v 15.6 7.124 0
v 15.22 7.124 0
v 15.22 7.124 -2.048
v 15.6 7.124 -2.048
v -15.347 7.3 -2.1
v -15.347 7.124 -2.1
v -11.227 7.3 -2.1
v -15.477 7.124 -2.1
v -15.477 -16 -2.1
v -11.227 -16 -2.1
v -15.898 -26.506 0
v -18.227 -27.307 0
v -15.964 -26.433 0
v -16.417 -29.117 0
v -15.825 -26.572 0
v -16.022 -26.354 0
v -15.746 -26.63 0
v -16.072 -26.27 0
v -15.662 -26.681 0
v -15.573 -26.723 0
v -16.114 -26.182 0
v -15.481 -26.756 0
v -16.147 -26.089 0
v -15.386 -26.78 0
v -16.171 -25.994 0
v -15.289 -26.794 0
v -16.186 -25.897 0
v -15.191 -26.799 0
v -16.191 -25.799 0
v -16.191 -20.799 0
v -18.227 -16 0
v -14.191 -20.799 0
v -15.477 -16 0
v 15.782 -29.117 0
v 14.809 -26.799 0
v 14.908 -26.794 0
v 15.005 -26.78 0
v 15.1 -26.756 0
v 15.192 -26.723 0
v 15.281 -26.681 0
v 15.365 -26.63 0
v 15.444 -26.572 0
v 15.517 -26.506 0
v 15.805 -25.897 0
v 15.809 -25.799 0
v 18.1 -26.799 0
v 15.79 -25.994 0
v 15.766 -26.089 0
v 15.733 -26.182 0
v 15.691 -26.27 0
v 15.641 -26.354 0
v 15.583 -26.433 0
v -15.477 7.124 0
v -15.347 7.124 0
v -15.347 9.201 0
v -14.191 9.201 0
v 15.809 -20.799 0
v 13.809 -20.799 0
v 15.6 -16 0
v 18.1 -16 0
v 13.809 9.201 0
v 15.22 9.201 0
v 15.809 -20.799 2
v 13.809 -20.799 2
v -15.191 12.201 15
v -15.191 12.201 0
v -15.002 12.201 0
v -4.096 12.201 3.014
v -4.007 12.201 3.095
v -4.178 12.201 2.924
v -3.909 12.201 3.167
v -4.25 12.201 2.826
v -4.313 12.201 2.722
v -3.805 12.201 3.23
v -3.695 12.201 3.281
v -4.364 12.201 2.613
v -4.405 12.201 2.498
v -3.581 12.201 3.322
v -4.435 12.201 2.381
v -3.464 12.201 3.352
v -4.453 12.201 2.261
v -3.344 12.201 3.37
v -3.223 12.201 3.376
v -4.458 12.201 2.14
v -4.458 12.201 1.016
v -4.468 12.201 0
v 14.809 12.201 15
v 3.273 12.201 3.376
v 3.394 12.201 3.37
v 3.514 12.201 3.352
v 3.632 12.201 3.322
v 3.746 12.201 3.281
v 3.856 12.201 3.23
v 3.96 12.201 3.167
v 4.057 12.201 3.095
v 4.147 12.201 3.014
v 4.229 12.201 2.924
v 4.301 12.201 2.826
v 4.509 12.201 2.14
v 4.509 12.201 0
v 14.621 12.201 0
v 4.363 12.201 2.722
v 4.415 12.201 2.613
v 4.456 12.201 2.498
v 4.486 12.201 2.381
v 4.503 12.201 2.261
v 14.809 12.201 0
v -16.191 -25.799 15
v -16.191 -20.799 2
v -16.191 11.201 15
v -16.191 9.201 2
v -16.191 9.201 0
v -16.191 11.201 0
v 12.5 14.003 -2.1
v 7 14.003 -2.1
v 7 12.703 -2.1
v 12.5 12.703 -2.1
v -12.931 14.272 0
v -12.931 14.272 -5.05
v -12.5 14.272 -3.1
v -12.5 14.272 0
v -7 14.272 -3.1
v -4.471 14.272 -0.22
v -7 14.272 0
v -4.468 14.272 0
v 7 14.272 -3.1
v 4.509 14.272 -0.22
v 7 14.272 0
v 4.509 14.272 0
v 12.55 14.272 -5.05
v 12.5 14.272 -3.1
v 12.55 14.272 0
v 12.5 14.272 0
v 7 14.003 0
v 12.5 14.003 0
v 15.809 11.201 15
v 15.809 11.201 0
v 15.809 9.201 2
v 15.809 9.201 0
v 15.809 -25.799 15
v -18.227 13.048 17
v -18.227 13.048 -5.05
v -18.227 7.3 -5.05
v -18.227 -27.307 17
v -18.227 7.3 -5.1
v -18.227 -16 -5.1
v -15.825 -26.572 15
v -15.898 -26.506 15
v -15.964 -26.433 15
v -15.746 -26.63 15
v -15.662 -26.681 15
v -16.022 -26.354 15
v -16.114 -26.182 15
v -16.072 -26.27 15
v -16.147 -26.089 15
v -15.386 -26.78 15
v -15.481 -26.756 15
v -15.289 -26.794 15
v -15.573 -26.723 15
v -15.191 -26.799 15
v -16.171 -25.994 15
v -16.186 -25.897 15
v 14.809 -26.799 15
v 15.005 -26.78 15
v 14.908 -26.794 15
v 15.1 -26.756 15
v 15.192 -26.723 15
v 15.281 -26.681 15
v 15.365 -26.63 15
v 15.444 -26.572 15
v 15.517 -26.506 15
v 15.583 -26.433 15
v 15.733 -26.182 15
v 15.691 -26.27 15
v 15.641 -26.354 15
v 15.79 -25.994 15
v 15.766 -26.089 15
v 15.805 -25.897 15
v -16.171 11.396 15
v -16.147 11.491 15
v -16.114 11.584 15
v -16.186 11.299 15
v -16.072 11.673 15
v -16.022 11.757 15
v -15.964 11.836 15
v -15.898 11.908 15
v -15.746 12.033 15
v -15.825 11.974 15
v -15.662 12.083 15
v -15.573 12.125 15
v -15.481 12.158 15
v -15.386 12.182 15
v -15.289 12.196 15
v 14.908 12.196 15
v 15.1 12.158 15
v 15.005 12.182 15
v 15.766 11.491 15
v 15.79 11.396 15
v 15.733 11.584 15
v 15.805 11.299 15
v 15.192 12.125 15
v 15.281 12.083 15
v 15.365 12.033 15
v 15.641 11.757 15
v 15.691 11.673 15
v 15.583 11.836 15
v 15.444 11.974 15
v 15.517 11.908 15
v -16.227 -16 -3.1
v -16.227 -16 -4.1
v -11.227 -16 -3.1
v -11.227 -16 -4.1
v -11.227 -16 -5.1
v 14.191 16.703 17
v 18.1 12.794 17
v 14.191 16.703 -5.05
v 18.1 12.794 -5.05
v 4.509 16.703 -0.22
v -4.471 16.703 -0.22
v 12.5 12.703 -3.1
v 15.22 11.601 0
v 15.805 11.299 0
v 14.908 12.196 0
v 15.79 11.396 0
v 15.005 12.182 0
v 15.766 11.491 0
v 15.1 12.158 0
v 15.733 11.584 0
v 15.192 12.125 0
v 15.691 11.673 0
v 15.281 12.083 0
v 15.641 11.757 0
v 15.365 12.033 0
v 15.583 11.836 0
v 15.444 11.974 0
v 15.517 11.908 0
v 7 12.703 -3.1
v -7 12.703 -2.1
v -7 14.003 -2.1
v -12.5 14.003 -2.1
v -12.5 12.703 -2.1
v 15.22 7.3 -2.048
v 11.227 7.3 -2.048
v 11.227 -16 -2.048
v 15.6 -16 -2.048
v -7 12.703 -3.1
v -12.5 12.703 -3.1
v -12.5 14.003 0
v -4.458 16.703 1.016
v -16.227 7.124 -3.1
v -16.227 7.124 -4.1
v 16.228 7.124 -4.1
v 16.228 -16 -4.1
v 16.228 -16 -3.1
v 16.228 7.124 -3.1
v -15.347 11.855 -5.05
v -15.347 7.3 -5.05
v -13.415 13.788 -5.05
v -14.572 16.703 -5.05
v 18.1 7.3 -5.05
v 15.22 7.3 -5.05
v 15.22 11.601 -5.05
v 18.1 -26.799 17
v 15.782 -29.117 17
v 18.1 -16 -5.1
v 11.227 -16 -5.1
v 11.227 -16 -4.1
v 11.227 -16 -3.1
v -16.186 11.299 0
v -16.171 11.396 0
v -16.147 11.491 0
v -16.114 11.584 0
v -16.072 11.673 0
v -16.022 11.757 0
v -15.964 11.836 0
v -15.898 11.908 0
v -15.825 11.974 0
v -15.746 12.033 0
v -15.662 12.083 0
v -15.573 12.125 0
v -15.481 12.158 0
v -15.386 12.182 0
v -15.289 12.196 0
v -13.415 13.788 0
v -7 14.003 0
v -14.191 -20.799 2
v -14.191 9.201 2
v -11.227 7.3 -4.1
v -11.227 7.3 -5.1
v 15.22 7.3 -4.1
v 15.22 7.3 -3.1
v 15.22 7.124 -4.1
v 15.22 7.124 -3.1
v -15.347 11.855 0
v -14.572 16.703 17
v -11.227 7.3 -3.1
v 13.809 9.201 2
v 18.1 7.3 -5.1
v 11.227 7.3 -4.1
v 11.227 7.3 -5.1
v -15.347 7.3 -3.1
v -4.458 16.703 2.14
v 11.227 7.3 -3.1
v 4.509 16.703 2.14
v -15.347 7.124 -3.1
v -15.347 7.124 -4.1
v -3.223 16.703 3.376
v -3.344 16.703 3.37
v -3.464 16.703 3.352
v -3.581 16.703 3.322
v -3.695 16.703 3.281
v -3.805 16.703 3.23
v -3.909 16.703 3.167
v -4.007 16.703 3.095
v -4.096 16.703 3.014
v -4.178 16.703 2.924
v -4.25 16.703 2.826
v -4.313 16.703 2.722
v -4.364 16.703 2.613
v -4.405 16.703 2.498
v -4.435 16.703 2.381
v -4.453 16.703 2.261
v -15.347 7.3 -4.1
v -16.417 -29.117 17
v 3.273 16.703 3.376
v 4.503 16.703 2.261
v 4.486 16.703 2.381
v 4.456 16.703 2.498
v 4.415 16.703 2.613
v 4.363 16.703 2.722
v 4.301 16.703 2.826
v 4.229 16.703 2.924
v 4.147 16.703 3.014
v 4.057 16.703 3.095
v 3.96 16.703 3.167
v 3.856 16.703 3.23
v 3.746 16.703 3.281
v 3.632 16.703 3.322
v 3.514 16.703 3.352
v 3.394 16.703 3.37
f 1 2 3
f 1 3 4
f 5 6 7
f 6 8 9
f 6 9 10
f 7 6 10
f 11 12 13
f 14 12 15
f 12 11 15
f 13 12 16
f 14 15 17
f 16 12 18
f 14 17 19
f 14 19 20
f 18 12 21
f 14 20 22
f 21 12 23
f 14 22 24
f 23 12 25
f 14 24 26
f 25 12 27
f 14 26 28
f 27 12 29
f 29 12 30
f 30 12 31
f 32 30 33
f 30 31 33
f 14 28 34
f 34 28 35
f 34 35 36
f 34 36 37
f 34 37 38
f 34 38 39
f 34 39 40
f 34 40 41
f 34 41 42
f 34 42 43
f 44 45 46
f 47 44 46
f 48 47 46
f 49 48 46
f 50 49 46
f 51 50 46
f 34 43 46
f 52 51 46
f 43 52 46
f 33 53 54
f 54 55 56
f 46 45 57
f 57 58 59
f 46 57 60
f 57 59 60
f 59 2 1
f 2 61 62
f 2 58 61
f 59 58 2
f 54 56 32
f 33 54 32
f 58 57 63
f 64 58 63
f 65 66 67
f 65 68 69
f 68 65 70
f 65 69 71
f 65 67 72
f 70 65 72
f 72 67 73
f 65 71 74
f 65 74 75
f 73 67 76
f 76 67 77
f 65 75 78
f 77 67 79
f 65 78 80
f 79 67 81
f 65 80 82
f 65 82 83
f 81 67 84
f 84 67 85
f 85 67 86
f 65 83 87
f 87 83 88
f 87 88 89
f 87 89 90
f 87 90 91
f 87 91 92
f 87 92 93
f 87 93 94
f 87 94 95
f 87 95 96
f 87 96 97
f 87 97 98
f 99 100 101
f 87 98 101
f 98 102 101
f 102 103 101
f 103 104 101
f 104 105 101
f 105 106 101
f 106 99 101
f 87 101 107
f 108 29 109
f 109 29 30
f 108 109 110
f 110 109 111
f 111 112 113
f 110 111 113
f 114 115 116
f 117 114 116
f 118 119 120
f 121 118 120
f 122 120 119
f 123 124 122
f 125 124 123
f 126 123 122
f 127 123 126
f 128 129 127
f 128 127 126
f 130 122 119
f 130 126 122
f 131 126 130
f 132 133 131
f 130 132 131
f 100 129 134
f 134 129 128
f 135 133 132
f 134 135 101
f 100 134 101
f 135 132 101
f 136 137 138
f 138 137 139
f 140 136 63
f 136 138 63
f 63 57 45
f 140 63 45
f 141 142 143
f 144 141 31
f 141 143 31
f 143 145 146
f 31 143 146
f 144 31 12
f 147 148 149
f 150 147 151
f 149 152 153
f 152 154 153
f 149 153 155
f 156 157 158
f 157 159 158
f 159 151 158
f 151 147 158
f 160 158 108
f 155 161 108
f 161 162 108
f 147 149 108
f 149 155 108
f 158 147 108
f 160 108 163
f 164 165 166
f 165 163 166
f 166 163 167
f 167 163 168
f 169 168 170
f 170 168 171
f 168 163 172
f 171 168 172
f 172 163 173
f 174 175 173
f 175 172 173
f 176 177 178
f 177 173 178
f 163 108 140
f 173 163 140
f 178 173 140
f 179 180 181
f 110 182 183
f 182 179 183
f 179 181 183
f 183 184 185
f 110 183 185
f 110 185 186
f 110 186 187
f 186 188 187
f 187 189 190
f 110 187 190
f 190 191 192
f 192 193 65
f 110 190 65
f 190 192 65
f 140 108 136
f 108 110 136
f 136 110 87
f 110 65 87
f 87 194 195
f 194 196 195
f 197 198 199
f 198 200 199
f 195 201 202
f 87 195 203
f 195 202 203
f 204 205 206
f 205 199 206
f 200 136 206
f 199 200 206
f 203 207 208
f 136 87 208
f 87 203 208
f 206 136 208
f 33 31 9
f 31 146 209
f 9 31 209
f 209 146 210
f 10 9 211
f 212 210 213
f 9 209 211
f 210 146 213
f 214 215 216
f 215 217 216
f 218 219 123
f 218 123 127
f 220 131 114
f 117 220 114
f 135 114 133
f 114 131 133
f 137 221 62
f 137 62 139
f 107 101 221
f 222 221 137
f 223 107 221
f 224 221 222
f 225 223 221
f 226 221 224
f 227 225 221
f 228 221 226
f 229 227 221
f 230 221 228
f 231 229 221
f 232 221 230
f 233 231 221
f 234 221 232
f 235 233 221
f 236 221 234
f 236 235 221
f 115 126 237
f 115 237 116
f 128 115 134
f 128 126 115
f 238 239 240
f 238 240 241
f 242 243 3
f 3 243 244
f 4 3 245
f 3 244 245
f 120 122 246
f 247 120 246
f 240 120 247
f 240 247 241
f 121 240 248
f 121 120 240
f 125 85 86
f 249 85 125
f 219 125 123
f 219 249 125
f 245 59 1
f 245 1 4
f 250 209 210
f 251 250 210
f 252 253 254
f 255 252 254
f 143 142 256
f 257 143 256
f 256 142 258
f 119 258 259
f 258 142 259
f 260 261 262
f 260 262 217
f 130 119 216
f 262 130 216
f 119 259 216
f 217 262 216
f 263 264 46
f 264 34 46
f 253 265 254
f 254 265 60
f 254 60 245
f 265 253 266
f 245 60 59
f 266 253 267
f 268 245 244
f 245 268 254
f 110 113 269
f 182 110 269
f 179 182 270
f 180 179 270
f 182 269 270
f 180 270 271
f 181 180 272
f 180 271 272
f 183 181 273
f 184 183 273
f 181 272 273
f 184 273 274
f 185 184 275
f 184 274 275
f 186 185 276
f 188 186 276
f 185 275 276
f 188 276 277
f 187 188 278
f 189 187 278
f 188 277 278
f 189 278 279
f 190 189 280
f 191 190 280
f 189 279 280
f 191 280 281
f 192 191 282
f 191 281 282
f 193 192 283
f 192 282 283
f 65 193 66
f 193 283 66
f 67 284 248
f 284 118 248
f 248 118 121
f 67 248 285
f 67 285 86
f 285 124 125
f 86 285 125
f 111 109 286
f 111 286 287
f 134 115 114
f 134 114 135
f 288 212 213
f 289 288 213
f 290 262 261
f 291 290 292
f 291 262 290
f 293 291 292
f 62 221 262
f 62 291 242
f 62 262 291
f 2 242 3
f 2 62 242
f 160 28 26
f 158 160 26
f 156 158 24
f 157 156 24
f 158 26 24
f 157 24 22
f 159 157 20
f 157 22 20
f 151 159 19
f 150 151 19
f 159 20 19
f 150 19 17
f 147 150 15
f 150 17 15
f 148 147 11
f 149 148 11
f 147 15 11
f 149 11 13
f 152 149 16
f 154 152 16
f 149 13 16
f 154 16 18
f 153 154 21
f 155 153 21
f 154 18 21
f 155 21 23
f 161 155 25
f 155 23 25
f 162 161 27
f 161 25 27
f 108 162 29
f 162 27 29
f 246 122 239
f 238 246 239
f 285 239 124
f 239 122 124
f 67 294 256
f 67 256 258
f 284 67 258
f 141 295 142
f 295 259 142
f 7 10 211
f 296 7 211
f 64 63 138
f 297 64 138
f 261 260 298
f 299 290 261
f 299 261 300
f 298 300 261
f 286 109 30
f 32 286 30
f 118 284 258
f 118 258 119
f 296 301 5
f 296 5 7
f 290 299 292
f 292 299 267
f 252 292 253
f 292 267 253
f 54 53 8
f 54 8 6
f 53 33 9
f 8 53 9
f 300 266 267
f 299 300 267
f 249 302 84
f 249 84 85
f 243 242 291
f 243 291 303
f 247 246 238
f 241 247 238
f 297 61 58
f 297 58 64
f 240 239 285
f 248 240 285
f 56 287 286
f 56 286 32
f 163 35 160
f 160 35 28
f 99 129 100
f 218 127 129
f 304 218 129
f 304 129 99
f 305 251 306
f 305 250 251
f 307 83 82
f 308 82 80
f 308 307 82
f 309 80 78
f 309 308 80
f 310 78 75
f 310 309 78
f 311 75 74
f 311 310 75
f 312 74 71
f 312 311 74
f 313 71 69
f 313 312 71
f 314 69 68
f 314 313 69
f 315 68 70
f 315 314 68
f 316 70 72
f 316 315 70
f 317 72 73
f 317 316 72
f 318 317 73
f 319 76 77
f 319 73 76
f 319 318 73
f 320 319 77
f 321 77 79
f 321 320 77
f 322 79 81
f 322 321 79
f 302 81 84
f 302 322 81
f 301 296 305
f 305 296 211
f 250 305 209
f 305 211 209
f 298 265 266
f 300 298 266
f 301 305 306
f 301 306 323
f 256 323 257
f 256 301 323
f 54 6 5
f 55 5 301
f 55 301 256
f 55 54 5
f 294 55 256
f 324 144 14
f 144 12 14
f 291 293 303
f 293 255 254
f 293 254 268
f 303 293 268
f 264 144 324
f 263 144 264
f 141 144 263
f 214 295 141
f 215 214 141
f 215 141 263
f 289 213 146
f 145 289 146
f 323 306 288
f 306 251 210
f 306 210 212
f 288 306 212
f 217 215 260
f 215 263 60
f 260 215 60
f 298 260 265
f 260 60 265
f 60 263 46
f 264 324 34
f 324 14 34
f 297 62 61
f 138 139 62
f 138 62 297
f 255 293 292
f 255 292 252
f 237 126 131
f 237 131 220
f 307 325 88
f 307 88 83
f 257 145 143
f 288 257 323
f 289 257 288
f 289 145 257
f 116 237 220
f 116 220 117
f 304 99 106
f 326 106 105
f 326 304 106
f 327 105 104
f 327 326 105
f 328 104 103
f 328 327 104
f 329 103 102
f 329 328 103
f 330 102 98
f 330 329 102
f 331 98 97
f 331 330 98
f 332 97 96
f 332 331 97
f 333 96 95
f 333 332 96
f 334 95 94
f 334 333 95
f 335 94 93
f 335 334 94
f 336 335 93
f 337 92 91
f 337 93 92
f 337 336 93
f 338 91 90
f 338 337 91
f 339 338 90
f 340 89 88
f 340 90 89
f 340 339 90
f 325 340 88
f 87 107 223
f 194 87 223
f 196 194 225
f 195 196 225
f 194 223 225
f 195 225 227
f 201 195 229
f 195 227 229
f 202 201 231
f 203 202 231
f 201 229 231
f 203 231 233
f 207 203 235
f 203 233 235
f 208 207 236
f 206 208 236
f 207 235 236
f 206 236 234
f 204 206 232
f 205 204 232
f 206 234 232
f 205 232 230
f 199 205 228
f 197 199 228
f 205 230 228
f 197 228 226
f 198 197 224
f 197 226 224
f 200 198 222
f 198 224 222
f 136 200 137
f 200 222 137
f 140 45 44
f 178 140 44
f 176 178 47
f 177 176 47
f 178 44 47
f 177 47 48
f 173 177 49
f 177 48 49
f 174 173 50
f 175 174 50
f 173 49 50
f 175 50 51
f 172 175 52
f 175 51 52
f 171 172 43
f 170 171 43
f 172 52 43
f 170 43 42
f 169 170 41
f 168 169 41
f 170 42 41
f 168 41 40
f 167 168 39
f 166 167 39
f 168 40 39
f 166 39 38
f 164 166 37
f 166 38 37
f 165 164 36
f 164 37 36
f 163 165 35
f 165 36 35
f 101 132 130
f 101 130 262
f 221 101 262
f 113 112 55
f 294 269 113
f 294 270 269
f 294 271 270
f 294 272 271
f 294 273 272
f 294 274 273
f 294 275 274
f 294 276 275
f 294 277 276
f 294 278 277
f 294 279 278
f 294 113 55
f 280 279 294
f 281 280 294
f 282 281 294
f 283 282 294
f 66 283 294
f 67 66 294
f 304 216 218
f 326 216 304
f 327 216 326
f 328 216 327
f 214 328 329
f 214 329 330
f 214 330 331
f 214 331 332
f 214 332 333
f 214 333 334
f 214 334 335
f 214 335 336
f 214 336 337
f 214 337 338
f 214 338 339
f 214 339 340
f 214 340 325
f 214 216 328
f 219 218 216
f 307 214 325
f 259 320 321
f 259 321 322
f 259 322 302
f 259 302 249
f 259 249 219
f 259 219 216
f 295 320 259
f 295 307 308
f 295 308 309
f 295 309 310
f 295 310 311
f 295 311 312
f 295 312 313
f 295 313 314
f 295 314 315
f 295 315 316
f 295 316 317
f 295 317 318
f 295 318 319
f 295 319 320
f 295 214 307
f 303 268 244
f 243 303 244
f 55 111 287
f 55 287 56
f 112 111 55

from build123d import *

# Parameters (mm, degrees)
EXTRUDE_1_DEPTH      = 15
EXTRUDE_2_DEPTH      = 2
SKETCH_3_W           = 2
SKETCH_3_H           = 30
EXTRUDE_3_DEPTH      = 2
SKETCH_4_W           = 2
SKETCH_4_H           = 30
EXTRUDE_4_DEPTH      = 2
EXTRUDE_START        = 7
EXTRUDE_5_DEPTH      = 5.5
EXTRUDE_6_DEPTH      = 7.3
EXTRUDE_6_DEPTH_BACK = 16
EXTRUDE_7_DEPTH      = 23.3
EXTRUDE_9_DEPTH      = 5.05
CUT_EXTRUDE_3_DEPTH  = 8.15


with BuildPart() as part:
    # 草图1 → 凸台-拉伸1 (new body)
    with BuildSketch(Plane.XY):
        Polygon((15.781834721, -29.117348235), (18.100330201, -26.798852755), (18.100330201, 12.794403278), (14.191406072, 16.703327407), (-14.572406834, 16.703327407), (-18.227330455, 13.048403786), (-18.227330455, -27.306853771), (-16.416835991, -29.117348235), align=None)
        with BuildLine():
            ThreePointArc((-15.190500381, -26.798852755), (-15.897607162, -26.505959536), (-16.190500381, -25.798852755))
            Line((-16.190500381, -25.798852755), (-16.190500381, 11.201147245))
            ThreePointArc((-16.190500381, 11.201147245), (-15.897607162, 11.908254026), (-15.190500381, 12.201147245))
            Line((-15.190500381, 12.201147245), (14.809499619, 12.201147245))
            ThreePointArc((14.809499619, 12.201147245), (15.5166064, 11.908254026), (15.809499619, 11.201147245))
            Line((15.809499619, 11.201147245), (15.809499619, -25.798852755))
            ThreePointArc((15.809499619, -25.798852755), (15.5166064, -26.505959536), (14.809499619, -26.798852755))
            Line((14.809499619, -26.798852755), (-15.190500381, -26.798852755))
        make_face(mode=Mode.SUBTRACT)
    extrude(amount=EXTRUDE_1_DEPTH)

    # 草图2 → 凸台-拉伸2 (add)
    with BuildSketch(Plane.XY.offset(15)):
        Polygon((-14.572406834, 16.703327407), (-18.227330455, 13.048403786), (-18.227330455, -27.306853771), (-16.416835991, -29.117348235), (-0.317500635, -29.117348235), (15.781834721, -29.117348235), (18.100330201, -26.798852755), (18.100330201, 12.794403278), (14.191406072, 16.703327407), align=None)
    extrude(amount=EXTRUDE_2_DEPTH)

    # 草图3 → 凸台-拉伸3 (add)
    with BuildSketch(Plane(origin=(-16.190500381, 0, 0), x_dir=(0, 0, -1), z_dir=(1, 0, 0))):
        with Locations((-1, -5.798852755)):
            Rectangle(SKETCH_3_W, SKETCH_3_H)
    extrude(amount=EXTRUDE_3_DEPTH)

    # 草图4 → 凸台-拉伸4 (add)
    with BuildSketch(Plane.ZY.offset(-15.809499619)):
        with Locations((1, -5.798852755)):
            Rectangle(SKETCH_4_W, SKETCH_4_H)
    extrude(amount=EXTRUDE_4_DEPTH)

    # 草图5 → 凸台-拉伸5 (add)
    with BuildSketch(Plane(origin=(0, 0, 0), x_dir=(0, 0, -1), z_dir=(1, 0, 0)).offset(EXTRUDE_START)):
        Polygon((3.1000508, 15.353327407), (0, 15.353327407), (0, 14.003327407), (2.1000508, 14.003327407), (2.1000508, 13.703327407), (2.1000508, 12.703327407), (3.1000508, 12.703327407), align=None)
    extrude_5 = extrude(amount=EXTRUDE_5_DEPTH)

    # 镜向1: 凸台-拉伸5 across plane
    add(extrude_5.mirror(Plane(origin=(0, 0, 0), x_dir=(0, 0, 1), z_dir=(1, 0, 0))))

    # 草图7 → 凸台-拉伸6 (add, two sides: drawn at the far end of the back side and taken through both)
    with BuildSketch(Plane(origin=(0, 0, 0), x_dir=(1, 0, 0), z_dir=(0, 1, 0)).offset(-EXTRUDE_6_DEPTH_BACK)):
        Polygon((-18.227330455, 3.1), (-18.227330455, 0), (-15.477330455, 0), (-15.477330455, 2.1000508), (-15.227330455, 2.1000508), (-11.227330455, 2.1000508), (-11.227330455, 3.1), (-16.227330455, 3.1), (-16.227330455, 4.1), (-11.227330455, 4.1), (-11.227330455, 5.1), (-18.227330455, 5.1), (-18.227330455, 4.1), align=None)
    extrude(amount=EXTRUDE_6_DEPTH + EXTRUDE_6_DEPTH_BACK)

    # 草图10 → 凸台-拉伸7 (add)
    with BuildSketch(Plane.XZ.offset(16)):
        Polygon((16.227721063, -3.100000069), (11.227330455, -3.100000069), (11.227330455, -2.048141563), (15.600330201, -2.048141563), (15.600330201, -1.6000508), (15.600330201, 0), (16.226569186, 0.001858295), (18.100330201, 0), (18.100330201, -5.1), (11.227330455, -5.1), (11.227330455, -4.1), (16.228092414, -4.1), align=None)
    extrude(amount=-EXTRUDE_7_DEPTH)

    # 草图11 → 凸台-拉伸9 (add)
    with BuildSketch(Plane(origin=(0, 0, 0), x_dir=(-1, 0, 0), z_dir=(0, 0, -1))):
        Polygon((-15.220330201, 7.12413323), (-18.100330201, 7.12413323), (-18.100330201, 12.794403278), (-14.191406072, 16.703327407), (14.572406834, 16.703327407), (18.227330455, 13.048403786), (18.227330455, 7.12413323), (15.347330455, 7.12413323), (15.347330455, 11.855468727), (13.414618961, 13.78818022), (12.930706389, 14.272092792), (-12.549705627, 14.272092792), (-15.220330201, 11.601468219), align=None)
    extrude(amount=EXTRUDE_9_DEPTH)

    # 草图14 → 切除-拉伸3 (cut)
    with BuildSketch(Plane(origin=(0, 16.703327407, 0), x_dir=(1, 0, 0), z_dir=(0, 1, 0))):
        with BuildLine():
            ThreePointArc((-4.458496317, -2.139582087), (-4.096481847, -3.01356233), (-3.222501604, -3.3755768))
            Line((-3.222501604, -3.3755768), (3.273301705, -3.3755768))
            ThreePointArc((3.273301705, -3.3755768), (4.147281949, -3.01356233), (4.509296419, -2.139582087))
            Line((4.509296419, -2.139582087), (4.509296419, 0.219606282))
            Line((4.509296419, 0.219606282), (-4.470508001, 0.219606282))
            Line((-4.470508001, 0.219606282), (-4.458496317, -1.016388431))
            Line((-4.458496317, -1.016388431), (-4.458496317, -2.139582087))
        make_face()
    extrude(amount=-CUT_EXTRUDE_3_DEPTH, mode=Mode.SUBTRACT)


solid = part.part
